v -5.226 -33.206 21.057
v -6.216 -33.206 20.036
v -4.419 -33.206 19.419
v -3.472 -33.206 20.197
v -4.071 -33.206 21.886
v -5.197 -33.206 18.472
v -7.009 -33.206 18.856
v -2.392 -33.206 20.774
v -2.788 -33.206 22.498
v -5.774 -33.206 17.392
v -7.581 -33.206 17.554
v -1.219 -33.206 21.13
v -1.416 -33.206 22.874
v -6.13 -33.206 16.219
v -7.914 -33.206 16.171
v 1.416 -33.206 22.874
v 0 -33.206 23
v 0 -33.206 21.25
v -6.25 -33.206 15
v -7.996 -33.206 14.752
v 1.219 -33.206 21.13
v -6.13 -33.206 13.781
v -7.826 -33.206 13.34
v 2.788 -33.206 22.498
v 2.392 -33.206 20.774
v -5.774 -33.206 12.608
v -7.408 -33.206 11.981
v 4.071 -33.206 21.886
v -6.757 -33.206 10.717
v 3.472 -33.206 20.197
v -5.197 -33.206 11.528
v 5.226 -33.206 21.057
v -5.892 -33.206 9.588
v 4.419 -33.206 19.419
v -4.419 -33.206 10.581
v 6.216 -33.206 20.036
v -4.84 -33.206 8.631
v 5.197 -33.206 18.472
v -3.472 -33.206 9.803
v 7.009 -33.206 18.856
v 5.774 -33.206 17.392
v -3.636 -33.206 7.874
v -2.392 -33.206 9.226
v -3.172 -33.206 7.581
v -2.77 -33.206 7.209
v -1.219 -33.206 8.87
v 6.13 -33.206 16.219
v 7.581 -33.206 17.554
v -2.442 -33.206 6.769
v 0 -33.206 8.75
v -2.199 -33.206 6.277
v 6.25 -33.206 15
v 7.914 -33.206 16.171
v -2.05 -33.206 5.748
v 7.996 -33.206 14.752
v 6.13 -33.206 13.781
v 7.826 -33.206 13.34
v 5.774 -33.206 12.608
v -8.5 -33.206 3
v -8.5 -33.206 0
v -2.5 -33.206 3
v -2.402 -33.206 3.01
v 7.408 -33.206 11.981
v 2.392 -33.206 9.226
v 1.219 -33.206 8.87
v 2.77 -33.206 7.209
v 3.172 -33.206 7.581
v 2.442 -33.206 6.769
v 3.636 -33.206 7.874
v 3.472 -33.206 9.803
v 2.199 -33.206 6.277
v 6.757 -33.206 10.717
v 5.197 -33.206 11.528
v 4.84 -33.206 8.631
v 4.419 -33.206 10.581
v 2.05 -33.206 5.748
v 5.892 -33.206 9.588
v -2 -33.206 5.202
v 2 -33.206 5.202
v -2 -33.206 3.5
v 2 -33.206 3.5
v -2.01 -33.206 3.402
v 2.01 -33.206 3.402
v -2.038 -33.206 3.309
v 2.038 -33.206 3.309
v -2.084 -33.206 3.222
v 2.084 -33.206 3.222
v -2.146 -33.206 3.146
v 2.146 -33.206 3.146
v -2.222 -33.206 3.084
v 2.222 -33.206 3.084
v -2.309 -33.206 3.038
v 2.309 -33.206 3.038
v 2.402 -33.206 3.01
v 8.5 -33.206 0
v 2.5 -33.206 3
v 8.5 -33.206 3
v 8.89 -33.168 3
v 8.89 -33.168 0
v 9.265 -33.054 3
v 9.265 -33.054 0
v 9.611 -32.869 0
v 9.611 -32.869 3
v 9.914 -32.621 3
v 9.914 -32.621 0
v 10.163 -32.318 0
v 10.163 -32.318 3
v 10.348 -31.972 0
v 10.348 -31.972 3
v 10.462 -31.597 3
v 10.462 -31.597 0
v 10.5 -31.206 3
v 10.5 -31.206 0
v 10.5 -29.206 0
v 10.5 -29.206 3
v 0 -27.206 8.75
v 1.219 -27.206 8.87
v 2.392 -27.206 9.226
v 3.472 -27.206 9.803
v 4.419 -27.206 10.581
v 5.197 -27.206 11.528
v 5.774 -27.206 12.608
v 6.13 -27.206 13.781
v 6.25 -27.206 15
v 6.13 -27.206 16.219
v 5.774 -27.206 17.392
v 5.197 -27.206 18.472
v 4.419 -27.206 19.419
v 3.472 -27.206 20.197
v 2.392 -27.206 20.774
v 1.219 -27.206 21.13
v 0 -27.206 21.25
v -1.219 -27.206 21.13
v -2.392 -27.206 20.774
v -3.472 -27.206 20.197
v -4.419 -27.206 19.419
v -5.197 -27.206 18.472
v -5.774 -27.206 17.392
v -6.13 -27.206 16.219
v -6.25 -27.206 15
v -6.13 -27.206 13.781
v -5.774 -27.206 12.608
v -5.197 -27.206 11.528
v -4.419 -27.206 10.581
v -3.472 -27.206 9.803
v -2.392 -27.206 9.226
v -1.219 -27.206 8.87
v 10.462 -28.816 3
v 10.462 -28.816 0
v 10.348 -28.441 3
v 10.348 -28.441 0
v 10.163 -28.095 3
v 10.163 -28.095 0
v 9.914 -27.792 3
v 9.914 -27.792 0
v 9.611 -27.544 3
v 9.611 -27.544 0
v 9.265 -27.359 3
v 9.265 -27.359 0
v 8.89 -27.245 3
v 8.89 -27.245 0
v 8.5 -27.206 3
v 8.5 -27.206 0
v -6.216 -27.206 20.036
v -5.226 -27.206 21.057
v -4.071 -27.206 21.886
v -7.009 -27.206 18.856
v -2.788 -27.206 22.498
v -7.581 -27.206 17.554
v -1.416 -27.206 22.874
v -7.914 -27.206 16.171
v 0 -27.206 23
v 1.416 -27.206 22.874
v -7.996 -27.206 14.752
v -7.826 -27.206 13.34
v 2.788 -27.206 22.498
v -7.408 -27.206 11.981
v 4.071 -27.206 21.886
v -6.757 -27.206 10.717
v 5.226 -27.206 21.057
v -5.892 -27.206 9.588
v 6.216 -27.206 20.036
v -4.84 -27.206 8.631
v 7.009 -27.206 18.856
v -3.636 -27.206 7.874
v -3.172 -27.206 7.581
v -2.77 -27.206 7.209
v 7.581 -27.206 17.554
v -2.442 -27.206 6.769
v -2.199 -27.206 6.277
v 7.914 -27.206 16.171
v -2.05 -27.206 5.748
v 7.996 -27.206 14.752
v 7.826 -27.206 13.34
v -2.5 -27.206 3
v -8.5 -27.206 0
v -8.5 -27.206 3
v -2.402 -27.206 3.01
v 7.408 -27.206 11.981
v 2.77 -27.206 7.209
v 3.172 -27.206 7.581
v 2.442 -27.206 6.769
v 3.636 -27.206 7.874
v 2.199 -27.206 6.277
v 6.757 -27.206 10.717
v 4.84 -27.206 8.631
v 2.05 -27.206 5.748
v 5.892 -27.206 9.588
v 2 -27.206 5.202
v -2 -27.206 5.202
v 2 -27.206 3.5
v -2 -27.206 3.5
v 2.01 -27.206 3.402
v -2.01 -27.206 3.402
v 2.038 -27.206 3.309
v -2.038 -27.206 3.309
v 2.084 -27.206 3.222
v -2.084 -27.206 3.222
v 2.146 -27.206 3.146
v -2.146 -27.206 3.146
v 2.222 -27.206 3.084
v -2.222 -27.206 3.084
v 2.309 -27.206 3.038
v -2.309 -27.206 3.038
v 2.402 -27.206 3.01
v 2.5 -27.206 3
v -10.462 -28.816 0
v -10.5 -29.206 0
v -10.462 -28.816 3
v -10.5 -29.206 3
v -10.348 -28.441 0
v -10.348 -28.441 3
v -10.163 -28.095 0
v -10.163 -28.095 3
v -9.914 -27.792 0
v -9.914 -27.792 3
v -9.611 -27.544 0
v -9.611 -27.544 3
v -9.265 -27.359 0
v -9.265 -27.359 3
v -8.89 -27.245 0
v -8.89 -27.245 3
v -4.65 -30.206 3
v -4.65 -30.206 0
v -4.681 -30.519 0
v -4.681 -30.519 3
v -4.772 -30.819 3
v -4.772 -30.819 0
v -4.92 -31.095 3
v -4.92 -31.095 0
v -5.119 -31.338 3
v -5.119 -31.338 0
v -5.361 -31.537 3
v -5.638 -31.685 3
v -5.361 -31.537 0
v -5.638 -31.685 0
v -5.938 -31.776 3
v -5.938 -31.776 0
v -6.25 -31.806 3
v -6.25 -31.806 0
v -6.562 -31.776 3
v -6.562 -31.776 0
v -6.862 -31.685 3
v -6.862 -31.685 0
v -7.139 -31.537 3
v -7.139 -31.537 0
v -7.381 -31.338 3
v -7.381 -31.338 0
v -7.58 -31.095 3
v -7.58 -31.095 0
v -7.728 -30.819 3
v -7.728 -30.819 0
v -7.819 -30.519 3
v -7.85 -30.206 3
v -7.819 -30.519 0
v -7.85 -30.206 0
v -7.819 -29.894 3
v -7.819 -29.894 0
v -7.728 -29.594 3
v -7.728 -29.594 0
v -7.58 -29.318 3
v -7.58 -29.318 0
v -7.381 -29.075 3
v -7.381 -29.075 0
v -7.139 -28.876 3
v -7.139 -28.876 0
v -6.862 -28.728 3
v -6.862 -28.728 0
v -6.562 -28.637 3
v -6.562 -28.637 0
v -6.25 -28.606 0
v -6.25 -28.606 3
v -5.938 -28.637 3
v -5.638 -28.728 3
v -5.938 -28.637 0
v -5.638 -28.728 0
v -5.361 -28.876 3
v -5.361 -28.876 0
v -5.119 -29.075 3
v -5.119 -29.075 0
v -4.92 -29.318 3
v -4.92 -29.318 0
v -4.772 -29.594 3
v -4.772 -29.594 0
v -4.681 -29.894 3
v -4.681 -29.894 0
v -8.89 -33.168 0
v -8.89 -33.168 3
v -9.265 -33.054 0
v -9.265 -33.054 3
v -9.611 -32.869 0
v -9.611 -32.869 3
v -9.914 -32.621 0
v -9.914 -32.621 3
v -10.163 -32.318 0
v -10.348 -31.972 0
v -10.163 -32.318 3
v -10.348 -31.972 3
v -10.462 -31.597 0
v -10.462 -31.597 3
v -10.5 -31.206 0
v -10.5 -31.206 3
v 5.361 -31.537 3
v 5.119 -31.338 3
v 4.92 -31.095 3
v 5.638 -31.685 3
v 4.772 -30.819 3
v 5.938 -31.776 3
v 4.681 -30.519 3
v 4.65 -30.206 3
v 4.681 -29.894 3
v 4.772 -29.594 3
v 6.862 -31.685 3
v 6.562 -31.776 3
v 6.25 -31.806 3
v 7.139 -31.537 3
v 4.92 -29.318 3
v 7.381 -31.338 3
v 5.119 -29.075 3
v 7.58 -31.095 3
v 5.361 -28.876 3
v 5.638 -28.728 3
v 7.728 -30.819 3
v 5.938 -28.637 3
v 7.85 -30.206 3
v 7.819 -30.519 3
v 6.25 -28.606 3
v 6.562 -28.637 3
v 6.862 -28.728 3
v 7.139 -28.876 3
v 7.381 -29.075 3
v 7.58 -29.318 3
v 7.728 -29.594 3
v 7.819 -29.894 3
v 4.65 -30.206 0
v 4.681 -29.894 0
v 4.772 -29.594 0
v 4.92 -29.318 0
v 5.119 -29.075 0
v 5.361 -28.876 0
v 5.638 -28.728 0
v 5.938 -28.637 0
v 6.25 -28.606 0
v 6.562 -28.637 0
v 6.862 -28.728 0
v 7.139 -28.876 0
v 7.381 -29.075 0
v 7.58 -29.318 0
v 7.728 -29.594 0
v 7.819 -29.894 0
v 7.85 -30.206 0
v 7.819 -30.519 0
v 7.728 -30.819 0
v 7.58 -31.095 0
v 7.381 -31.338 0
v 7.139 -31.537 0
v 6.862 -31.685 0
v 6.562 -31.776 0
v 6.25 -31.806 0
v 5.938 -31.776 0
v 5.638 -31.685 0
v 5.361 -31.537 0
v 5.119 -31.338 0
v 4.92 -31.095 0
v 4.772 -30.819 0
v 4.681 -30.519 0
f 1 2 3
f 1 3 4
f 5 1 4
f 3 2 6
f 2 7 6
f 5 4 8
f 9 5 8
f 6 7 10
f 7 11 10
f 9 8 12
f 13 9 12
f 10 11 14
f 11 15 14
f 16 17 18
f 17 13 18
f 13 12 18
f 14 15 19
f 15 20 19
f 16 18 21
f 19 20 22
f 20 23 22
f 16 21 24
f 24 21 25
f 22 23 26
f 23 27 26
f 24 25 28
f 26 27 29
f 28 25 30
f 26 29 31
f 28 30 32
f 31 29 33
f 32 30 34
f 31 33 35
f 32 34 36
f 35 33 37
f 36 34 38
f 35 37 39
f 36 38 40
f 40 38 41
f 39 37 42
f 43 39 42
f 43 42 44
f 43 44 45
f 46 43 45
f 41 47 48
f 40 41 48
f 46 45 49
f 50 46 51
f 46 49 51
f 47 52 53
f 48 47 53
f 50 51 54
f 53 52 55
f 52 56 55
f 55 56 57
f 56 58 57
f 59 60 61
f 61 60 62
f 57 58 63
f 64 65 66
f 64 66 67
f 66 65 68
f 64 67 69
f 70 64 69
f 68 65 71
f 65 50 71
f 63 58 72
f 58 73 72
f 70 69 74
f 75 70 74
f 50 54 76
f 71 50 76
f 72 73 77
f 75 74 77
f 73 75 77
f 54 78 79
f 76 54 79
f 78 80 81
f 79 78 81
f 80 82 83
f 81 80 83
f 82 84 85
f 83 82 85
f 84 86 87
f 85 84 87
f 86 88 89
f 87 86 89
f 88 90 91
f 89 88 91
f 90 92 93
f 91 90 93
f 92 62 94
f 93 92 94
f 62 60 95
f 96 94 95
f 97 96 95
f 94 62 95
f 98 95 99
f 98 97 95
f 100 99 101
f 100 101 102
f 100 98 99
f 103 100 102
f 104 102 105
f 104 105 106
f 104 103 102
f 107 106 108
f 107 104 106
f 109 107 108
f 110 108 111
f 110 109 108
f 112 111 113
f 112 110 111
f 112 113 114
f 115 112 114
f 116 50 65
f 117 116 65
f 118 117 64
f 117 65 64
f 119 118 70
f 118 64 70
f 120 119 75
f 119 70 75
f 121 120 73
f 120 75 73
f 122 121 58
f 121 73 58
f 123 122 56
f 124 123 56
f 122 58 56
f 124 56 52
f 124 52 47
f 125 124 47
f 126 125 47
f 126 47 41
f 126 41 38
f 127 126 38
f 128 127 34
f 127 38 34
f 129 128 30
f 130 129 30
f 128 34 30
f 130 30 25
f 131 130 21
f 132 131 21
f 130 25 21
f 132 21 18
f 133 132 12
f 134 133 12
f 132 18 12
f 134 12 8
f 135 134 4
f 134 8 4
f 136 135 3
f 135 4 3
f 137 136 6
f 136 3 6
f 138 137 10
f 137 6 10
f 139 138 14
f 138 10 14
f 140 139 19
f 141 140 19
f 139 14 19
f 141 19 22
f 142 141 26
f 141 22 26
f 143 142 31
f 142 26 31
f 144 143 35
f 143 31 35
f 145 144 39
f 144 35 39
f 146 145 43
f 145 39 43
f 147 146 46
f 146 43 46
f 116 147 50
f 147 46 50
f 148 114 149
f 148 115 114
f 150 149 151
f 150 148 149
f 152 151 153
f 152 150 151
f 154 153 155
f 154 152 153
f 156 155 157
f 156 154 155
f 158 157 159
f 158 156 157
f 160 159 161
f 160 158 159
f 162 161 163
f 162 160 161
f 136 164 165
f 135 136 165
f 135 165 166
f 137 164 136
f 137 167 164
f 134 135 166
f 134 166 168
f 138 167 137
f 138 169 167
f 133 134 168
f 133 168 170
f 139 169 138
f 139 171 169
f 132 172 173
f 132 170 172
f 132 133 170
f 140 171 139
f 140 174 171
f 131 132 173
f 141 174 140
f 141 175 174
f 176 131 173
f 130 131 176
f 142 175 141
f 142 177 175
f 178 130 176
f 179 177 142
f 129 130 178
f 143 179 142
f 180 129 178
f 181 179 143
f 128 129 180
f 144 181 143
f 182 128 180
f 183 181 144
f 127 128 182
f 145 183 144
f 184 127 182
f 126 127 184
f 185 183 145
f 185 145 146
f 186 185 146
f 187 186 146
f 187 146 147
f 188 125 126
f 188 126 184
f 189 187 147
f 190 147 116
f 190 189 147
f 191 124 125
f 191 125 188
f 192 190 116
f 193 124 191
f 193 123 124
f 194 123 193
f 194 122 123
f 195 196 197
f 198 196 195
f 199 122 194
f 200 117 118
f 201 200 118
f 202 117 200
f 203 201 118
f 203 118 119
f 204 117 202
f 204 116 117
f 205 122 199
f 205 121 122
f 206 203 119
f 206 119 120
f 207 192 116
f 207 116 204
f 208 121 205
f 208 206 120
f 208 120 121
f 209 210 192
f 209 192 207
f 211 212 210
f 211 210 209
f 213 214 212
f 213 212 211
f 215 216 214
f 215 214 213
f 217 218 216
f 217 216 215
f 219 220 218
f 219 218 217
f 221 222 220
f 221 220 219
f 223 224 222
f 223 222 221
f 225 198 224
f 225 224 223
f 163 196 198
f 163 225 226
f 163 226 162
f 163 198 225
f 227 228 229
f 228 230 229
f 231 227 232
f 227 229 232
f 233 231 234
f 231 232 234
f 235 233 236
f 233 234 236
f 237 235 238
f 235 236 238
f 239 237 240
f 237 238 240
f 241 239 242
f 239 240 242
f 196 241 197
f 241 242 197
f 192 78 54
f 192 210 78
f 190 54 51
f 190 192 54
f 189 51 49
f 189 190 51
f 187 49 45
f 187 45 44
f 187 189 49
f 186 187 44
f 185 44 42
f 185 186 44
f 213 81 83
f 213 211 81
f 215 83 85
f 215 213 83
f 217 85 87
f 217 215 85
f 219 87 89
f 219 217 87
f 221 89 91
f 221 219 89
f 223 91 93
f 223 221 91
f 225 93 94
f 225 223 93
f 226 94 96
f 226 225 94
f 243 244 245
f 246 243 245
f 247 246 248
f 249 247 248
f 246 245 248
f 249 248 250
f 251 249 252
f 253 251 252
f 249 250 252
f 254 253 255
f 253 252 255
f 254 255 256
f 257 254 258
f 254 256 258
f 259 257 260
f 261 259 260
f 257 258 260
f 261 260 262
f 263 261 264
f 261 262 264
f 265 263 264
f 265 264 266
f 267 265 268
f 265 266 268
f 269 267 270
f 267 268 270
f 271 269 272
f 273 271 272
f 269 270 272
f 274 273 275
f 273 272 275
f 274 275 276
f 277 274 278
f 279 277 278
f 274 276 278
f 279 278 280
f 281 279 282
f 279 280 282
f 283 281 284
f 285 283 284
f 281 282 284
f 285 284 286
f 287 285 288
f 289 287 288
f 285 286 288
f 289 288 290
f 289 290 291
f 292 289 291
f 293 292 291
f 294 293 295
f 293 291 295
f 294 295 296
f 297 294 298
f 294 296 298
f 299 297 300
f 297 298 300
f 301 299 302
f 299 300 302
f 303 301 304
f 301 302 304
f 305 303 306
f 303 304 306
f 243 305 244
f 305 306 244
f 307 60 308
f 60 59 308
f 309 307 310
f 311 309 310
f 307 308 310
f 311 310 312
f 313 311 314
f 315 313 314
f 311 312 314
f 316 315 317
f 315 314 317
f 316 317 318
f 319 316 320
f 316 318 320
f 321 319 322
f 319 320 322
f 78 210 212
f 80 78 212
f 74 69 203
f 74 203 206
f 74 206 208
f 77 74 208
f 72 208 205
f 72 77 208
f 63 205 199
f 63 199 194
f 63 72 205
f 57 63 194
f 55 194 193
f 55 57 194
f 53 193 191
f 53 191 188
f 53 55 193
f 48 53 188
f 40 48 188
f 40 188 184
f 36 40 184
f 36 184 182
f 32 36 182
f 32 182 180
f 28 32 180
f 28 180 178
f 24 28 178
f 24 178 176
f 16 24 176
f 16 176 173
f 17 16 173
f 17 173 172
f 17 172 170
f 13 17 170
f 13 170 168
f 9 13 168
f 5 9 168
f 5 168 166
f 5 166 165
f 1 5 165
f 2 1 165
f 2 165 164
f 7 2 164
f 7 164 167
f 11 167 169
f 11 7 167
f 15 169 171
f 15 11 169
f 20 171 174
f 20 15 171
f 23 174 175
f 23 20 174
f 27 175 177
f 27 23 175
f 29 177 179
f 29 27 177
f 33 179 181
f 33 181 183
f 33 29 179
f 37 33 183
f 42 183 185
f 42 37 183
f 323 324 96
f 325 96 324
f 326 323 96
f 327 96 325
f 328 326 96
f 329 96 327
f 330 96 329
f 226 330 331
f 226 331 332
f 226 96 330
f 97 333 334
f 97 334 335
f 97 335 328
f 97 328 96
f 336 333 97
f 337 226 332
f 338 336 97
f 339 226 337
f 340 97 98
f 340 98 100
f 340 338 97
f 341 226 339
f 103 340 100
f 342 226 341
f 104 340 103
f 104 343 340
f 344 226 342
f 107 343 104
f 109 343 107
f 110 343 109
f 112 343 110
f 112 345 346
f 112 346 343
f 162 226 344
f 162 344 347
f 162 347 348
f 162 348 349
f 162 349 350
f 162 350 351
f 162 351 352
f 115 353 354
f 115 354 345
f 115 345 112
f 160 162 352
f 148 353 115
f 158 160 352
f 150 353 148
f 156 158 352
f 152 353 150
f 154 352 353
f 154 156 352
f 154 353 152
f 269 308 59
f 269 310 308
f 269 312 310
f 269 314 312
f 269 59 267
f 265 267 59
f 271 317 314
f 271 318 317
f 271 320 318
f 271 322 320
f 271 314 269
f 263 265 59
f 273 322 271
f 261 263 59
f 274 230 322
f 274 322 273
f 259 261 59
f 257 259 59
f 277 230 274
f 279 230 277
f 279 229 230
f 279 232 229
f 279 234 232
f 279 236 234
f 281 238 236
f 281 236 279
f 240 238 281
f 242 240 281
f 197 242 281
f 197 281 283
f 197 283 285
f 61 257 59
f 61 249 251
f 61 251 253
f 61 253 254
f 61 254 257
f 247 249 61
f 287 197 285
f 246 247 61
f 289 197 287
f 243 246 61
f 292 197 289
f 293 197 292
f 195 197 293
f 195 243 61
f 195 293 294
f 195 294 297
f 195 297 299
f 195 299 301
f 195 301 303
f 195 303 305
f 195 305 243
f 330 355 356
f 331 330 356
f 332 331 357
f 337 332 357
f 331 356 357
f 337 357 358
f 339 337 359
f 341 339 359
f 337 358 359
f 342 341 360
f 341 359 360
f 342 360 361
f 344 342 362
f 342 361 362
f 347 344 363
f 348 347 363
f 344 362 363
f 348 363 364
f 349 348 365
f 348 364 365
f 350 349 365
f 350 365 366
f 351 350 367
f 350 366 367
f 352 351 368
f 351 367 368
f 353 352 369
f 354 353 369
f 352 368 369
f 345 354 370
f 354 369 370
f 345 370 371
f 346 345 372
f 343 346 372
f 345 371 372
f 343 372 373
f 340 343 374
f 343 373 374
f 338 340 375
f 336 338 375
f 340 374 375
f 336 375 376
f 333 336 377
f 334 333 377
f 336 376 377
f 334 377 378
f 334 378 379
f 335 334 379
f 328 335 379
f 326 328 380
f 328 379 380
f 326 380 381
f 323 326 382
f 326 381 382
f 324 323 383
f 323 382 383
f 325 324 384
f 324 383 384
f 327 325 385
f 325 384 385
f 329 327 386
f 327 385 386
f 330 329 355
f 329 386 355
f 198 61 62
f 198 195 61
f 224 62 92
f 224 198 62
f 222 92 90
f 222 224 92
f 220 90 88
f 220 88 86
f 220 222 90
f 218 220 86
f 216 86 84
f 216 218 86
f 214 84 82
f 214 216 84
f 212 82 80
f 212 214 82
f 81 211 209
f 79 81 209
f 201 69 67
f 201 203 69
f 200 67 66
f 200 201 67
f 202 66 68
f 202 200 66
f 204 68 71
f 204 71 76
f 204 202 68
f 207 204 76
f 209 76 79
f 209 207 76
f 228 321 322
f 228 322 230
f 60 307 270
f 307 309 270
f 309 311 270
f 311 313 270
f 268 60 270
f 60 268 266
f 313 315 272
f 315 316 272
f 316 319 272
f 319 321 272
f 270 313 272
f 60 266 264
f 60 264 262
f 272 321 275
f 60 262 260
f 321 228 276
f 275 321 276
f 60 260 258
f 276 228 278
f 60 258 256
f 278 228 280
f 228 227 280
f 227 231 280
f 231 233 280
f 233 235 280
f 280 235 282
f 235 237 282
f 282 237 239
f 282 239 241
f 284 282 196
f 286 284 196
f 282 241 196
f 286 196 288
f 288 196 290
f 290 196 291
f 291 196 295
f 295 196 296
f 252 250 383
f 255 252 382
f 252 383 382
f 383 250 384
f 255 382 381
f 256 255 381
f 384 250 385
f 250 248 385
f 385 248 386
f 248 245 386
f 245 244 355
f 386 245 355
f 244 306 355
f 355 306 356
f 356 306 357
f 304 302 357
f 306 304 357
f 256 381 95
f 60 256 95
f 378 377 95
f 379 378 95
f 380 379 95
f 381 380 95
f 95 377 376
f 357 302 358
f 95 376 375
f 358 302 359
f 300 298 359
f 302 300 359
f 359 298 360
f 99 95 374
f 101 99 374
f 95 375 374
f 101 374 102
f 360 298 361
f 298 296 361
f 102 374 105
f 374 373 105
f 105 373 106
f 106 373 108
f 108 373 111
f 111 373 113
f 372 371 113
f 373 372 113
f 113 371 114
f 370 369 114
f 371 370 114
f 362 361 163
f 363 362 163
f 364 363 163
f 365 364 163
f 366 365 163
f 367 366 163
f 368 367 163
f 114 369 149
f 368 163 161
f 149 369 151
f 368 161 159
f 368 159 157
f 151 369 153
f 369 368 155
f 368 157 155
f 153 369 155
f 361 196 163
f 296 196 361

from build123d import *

# Parameters (mm, degrees)
SKETCH_1_W          = 21
SKETCH_1_H          = 6
EXTRUDE_1_DEPTH     = 3
SKETCH_2_R          = 6.25
EXTRUDE_2_DEPTH     = 6
SKETCH_4_R          = 1.6
CUT_EXTRUDE_1_DEPTH = 3
FILLET_1_R          = 0.5
FILLET_2_R          = 3
FILLET_3_R          = 2


with BuildPart() as part:
    # 草图1 → 凸台-拉伸1 (new body)
    with BuildSketch(Plane.XY):
        with Locations((0, -30.20649321)):
            Rectangle(SKETCH_1_W, SKETCH_1_H)
    extrude(amount=EXTRUDE_1_DEPTH)

    # 草图2 → 凸台-拉伸2 (add)
    with BuildSketch(Plane.XZ.offset(33.20649321)):
        with BuildLine():
            ThreePointArc((2, 7.254033308), (0, 23), (-2, 7.254033308))
            Line((-2, 7.254033308), (-2, 3))
            Line((-2, 3), (2, 3))
            Line((2, 3), (2, 7.254033308))
        make_face()
        with Locations(Location((0, 15, 0), (0, 0, 270))):
            Circle(SKETCH_2_R, mode=Mode.SUBTRACT)
    extrude(amount=-EXTRUDE_2_DEPTH)

    # 草图4 → 切除-拉伸1 (cut)
    with BuildSketch(Plane(origin=(0, 0, 0), x_dir=(-1, 0, 0), z_dir=(0, 0, -1))):
        with Locations((-6.25, -30.20649321)):
            Circle(SKETCH_4_R)
        with Locations(Location((6.25, -30.20649321, 0), (0, 0, 180))):
            Circle(SKETCH_4_R)
    extrude(amount=-CUT_EXTRUDE_1_DEPTH, mode=Mode.SUBTRACT)

    # 圆角1
    fillet_1_edges = [part.edges().sort_by_distance(p)[0] for p in [
        (-2, -30.20649321, 3),
        (2, -30.20649321, 3),
    ]]
    fillet(fillet_1_edges, radius=FILLET_1_R)

    # 圆角2
    fillet_2_edges = [part.edges().sort_by_distance(p)[0] for p in [
        (2, -30.20649321, 7.254033308),
        (-2, -30.20649321, 7.254033308),
    ]]
    fillet(fillet_2_edges, radius=FILLET_2_R)

    # 圆角3
    fillet_3_edges = [part.edges().sort_by_distance(p)[0] for p in [
        (10.5, -33.20649321, 1.5),
        (-10.5, -33.20649321, 1.5),
        (-10.5, -27.20649321, 1.5),
        (10.5, -27.20649321, 1.5),
    ]]
    fillet(fillet_3_edges, radius=FILLET_3_R)


solid = part.part
